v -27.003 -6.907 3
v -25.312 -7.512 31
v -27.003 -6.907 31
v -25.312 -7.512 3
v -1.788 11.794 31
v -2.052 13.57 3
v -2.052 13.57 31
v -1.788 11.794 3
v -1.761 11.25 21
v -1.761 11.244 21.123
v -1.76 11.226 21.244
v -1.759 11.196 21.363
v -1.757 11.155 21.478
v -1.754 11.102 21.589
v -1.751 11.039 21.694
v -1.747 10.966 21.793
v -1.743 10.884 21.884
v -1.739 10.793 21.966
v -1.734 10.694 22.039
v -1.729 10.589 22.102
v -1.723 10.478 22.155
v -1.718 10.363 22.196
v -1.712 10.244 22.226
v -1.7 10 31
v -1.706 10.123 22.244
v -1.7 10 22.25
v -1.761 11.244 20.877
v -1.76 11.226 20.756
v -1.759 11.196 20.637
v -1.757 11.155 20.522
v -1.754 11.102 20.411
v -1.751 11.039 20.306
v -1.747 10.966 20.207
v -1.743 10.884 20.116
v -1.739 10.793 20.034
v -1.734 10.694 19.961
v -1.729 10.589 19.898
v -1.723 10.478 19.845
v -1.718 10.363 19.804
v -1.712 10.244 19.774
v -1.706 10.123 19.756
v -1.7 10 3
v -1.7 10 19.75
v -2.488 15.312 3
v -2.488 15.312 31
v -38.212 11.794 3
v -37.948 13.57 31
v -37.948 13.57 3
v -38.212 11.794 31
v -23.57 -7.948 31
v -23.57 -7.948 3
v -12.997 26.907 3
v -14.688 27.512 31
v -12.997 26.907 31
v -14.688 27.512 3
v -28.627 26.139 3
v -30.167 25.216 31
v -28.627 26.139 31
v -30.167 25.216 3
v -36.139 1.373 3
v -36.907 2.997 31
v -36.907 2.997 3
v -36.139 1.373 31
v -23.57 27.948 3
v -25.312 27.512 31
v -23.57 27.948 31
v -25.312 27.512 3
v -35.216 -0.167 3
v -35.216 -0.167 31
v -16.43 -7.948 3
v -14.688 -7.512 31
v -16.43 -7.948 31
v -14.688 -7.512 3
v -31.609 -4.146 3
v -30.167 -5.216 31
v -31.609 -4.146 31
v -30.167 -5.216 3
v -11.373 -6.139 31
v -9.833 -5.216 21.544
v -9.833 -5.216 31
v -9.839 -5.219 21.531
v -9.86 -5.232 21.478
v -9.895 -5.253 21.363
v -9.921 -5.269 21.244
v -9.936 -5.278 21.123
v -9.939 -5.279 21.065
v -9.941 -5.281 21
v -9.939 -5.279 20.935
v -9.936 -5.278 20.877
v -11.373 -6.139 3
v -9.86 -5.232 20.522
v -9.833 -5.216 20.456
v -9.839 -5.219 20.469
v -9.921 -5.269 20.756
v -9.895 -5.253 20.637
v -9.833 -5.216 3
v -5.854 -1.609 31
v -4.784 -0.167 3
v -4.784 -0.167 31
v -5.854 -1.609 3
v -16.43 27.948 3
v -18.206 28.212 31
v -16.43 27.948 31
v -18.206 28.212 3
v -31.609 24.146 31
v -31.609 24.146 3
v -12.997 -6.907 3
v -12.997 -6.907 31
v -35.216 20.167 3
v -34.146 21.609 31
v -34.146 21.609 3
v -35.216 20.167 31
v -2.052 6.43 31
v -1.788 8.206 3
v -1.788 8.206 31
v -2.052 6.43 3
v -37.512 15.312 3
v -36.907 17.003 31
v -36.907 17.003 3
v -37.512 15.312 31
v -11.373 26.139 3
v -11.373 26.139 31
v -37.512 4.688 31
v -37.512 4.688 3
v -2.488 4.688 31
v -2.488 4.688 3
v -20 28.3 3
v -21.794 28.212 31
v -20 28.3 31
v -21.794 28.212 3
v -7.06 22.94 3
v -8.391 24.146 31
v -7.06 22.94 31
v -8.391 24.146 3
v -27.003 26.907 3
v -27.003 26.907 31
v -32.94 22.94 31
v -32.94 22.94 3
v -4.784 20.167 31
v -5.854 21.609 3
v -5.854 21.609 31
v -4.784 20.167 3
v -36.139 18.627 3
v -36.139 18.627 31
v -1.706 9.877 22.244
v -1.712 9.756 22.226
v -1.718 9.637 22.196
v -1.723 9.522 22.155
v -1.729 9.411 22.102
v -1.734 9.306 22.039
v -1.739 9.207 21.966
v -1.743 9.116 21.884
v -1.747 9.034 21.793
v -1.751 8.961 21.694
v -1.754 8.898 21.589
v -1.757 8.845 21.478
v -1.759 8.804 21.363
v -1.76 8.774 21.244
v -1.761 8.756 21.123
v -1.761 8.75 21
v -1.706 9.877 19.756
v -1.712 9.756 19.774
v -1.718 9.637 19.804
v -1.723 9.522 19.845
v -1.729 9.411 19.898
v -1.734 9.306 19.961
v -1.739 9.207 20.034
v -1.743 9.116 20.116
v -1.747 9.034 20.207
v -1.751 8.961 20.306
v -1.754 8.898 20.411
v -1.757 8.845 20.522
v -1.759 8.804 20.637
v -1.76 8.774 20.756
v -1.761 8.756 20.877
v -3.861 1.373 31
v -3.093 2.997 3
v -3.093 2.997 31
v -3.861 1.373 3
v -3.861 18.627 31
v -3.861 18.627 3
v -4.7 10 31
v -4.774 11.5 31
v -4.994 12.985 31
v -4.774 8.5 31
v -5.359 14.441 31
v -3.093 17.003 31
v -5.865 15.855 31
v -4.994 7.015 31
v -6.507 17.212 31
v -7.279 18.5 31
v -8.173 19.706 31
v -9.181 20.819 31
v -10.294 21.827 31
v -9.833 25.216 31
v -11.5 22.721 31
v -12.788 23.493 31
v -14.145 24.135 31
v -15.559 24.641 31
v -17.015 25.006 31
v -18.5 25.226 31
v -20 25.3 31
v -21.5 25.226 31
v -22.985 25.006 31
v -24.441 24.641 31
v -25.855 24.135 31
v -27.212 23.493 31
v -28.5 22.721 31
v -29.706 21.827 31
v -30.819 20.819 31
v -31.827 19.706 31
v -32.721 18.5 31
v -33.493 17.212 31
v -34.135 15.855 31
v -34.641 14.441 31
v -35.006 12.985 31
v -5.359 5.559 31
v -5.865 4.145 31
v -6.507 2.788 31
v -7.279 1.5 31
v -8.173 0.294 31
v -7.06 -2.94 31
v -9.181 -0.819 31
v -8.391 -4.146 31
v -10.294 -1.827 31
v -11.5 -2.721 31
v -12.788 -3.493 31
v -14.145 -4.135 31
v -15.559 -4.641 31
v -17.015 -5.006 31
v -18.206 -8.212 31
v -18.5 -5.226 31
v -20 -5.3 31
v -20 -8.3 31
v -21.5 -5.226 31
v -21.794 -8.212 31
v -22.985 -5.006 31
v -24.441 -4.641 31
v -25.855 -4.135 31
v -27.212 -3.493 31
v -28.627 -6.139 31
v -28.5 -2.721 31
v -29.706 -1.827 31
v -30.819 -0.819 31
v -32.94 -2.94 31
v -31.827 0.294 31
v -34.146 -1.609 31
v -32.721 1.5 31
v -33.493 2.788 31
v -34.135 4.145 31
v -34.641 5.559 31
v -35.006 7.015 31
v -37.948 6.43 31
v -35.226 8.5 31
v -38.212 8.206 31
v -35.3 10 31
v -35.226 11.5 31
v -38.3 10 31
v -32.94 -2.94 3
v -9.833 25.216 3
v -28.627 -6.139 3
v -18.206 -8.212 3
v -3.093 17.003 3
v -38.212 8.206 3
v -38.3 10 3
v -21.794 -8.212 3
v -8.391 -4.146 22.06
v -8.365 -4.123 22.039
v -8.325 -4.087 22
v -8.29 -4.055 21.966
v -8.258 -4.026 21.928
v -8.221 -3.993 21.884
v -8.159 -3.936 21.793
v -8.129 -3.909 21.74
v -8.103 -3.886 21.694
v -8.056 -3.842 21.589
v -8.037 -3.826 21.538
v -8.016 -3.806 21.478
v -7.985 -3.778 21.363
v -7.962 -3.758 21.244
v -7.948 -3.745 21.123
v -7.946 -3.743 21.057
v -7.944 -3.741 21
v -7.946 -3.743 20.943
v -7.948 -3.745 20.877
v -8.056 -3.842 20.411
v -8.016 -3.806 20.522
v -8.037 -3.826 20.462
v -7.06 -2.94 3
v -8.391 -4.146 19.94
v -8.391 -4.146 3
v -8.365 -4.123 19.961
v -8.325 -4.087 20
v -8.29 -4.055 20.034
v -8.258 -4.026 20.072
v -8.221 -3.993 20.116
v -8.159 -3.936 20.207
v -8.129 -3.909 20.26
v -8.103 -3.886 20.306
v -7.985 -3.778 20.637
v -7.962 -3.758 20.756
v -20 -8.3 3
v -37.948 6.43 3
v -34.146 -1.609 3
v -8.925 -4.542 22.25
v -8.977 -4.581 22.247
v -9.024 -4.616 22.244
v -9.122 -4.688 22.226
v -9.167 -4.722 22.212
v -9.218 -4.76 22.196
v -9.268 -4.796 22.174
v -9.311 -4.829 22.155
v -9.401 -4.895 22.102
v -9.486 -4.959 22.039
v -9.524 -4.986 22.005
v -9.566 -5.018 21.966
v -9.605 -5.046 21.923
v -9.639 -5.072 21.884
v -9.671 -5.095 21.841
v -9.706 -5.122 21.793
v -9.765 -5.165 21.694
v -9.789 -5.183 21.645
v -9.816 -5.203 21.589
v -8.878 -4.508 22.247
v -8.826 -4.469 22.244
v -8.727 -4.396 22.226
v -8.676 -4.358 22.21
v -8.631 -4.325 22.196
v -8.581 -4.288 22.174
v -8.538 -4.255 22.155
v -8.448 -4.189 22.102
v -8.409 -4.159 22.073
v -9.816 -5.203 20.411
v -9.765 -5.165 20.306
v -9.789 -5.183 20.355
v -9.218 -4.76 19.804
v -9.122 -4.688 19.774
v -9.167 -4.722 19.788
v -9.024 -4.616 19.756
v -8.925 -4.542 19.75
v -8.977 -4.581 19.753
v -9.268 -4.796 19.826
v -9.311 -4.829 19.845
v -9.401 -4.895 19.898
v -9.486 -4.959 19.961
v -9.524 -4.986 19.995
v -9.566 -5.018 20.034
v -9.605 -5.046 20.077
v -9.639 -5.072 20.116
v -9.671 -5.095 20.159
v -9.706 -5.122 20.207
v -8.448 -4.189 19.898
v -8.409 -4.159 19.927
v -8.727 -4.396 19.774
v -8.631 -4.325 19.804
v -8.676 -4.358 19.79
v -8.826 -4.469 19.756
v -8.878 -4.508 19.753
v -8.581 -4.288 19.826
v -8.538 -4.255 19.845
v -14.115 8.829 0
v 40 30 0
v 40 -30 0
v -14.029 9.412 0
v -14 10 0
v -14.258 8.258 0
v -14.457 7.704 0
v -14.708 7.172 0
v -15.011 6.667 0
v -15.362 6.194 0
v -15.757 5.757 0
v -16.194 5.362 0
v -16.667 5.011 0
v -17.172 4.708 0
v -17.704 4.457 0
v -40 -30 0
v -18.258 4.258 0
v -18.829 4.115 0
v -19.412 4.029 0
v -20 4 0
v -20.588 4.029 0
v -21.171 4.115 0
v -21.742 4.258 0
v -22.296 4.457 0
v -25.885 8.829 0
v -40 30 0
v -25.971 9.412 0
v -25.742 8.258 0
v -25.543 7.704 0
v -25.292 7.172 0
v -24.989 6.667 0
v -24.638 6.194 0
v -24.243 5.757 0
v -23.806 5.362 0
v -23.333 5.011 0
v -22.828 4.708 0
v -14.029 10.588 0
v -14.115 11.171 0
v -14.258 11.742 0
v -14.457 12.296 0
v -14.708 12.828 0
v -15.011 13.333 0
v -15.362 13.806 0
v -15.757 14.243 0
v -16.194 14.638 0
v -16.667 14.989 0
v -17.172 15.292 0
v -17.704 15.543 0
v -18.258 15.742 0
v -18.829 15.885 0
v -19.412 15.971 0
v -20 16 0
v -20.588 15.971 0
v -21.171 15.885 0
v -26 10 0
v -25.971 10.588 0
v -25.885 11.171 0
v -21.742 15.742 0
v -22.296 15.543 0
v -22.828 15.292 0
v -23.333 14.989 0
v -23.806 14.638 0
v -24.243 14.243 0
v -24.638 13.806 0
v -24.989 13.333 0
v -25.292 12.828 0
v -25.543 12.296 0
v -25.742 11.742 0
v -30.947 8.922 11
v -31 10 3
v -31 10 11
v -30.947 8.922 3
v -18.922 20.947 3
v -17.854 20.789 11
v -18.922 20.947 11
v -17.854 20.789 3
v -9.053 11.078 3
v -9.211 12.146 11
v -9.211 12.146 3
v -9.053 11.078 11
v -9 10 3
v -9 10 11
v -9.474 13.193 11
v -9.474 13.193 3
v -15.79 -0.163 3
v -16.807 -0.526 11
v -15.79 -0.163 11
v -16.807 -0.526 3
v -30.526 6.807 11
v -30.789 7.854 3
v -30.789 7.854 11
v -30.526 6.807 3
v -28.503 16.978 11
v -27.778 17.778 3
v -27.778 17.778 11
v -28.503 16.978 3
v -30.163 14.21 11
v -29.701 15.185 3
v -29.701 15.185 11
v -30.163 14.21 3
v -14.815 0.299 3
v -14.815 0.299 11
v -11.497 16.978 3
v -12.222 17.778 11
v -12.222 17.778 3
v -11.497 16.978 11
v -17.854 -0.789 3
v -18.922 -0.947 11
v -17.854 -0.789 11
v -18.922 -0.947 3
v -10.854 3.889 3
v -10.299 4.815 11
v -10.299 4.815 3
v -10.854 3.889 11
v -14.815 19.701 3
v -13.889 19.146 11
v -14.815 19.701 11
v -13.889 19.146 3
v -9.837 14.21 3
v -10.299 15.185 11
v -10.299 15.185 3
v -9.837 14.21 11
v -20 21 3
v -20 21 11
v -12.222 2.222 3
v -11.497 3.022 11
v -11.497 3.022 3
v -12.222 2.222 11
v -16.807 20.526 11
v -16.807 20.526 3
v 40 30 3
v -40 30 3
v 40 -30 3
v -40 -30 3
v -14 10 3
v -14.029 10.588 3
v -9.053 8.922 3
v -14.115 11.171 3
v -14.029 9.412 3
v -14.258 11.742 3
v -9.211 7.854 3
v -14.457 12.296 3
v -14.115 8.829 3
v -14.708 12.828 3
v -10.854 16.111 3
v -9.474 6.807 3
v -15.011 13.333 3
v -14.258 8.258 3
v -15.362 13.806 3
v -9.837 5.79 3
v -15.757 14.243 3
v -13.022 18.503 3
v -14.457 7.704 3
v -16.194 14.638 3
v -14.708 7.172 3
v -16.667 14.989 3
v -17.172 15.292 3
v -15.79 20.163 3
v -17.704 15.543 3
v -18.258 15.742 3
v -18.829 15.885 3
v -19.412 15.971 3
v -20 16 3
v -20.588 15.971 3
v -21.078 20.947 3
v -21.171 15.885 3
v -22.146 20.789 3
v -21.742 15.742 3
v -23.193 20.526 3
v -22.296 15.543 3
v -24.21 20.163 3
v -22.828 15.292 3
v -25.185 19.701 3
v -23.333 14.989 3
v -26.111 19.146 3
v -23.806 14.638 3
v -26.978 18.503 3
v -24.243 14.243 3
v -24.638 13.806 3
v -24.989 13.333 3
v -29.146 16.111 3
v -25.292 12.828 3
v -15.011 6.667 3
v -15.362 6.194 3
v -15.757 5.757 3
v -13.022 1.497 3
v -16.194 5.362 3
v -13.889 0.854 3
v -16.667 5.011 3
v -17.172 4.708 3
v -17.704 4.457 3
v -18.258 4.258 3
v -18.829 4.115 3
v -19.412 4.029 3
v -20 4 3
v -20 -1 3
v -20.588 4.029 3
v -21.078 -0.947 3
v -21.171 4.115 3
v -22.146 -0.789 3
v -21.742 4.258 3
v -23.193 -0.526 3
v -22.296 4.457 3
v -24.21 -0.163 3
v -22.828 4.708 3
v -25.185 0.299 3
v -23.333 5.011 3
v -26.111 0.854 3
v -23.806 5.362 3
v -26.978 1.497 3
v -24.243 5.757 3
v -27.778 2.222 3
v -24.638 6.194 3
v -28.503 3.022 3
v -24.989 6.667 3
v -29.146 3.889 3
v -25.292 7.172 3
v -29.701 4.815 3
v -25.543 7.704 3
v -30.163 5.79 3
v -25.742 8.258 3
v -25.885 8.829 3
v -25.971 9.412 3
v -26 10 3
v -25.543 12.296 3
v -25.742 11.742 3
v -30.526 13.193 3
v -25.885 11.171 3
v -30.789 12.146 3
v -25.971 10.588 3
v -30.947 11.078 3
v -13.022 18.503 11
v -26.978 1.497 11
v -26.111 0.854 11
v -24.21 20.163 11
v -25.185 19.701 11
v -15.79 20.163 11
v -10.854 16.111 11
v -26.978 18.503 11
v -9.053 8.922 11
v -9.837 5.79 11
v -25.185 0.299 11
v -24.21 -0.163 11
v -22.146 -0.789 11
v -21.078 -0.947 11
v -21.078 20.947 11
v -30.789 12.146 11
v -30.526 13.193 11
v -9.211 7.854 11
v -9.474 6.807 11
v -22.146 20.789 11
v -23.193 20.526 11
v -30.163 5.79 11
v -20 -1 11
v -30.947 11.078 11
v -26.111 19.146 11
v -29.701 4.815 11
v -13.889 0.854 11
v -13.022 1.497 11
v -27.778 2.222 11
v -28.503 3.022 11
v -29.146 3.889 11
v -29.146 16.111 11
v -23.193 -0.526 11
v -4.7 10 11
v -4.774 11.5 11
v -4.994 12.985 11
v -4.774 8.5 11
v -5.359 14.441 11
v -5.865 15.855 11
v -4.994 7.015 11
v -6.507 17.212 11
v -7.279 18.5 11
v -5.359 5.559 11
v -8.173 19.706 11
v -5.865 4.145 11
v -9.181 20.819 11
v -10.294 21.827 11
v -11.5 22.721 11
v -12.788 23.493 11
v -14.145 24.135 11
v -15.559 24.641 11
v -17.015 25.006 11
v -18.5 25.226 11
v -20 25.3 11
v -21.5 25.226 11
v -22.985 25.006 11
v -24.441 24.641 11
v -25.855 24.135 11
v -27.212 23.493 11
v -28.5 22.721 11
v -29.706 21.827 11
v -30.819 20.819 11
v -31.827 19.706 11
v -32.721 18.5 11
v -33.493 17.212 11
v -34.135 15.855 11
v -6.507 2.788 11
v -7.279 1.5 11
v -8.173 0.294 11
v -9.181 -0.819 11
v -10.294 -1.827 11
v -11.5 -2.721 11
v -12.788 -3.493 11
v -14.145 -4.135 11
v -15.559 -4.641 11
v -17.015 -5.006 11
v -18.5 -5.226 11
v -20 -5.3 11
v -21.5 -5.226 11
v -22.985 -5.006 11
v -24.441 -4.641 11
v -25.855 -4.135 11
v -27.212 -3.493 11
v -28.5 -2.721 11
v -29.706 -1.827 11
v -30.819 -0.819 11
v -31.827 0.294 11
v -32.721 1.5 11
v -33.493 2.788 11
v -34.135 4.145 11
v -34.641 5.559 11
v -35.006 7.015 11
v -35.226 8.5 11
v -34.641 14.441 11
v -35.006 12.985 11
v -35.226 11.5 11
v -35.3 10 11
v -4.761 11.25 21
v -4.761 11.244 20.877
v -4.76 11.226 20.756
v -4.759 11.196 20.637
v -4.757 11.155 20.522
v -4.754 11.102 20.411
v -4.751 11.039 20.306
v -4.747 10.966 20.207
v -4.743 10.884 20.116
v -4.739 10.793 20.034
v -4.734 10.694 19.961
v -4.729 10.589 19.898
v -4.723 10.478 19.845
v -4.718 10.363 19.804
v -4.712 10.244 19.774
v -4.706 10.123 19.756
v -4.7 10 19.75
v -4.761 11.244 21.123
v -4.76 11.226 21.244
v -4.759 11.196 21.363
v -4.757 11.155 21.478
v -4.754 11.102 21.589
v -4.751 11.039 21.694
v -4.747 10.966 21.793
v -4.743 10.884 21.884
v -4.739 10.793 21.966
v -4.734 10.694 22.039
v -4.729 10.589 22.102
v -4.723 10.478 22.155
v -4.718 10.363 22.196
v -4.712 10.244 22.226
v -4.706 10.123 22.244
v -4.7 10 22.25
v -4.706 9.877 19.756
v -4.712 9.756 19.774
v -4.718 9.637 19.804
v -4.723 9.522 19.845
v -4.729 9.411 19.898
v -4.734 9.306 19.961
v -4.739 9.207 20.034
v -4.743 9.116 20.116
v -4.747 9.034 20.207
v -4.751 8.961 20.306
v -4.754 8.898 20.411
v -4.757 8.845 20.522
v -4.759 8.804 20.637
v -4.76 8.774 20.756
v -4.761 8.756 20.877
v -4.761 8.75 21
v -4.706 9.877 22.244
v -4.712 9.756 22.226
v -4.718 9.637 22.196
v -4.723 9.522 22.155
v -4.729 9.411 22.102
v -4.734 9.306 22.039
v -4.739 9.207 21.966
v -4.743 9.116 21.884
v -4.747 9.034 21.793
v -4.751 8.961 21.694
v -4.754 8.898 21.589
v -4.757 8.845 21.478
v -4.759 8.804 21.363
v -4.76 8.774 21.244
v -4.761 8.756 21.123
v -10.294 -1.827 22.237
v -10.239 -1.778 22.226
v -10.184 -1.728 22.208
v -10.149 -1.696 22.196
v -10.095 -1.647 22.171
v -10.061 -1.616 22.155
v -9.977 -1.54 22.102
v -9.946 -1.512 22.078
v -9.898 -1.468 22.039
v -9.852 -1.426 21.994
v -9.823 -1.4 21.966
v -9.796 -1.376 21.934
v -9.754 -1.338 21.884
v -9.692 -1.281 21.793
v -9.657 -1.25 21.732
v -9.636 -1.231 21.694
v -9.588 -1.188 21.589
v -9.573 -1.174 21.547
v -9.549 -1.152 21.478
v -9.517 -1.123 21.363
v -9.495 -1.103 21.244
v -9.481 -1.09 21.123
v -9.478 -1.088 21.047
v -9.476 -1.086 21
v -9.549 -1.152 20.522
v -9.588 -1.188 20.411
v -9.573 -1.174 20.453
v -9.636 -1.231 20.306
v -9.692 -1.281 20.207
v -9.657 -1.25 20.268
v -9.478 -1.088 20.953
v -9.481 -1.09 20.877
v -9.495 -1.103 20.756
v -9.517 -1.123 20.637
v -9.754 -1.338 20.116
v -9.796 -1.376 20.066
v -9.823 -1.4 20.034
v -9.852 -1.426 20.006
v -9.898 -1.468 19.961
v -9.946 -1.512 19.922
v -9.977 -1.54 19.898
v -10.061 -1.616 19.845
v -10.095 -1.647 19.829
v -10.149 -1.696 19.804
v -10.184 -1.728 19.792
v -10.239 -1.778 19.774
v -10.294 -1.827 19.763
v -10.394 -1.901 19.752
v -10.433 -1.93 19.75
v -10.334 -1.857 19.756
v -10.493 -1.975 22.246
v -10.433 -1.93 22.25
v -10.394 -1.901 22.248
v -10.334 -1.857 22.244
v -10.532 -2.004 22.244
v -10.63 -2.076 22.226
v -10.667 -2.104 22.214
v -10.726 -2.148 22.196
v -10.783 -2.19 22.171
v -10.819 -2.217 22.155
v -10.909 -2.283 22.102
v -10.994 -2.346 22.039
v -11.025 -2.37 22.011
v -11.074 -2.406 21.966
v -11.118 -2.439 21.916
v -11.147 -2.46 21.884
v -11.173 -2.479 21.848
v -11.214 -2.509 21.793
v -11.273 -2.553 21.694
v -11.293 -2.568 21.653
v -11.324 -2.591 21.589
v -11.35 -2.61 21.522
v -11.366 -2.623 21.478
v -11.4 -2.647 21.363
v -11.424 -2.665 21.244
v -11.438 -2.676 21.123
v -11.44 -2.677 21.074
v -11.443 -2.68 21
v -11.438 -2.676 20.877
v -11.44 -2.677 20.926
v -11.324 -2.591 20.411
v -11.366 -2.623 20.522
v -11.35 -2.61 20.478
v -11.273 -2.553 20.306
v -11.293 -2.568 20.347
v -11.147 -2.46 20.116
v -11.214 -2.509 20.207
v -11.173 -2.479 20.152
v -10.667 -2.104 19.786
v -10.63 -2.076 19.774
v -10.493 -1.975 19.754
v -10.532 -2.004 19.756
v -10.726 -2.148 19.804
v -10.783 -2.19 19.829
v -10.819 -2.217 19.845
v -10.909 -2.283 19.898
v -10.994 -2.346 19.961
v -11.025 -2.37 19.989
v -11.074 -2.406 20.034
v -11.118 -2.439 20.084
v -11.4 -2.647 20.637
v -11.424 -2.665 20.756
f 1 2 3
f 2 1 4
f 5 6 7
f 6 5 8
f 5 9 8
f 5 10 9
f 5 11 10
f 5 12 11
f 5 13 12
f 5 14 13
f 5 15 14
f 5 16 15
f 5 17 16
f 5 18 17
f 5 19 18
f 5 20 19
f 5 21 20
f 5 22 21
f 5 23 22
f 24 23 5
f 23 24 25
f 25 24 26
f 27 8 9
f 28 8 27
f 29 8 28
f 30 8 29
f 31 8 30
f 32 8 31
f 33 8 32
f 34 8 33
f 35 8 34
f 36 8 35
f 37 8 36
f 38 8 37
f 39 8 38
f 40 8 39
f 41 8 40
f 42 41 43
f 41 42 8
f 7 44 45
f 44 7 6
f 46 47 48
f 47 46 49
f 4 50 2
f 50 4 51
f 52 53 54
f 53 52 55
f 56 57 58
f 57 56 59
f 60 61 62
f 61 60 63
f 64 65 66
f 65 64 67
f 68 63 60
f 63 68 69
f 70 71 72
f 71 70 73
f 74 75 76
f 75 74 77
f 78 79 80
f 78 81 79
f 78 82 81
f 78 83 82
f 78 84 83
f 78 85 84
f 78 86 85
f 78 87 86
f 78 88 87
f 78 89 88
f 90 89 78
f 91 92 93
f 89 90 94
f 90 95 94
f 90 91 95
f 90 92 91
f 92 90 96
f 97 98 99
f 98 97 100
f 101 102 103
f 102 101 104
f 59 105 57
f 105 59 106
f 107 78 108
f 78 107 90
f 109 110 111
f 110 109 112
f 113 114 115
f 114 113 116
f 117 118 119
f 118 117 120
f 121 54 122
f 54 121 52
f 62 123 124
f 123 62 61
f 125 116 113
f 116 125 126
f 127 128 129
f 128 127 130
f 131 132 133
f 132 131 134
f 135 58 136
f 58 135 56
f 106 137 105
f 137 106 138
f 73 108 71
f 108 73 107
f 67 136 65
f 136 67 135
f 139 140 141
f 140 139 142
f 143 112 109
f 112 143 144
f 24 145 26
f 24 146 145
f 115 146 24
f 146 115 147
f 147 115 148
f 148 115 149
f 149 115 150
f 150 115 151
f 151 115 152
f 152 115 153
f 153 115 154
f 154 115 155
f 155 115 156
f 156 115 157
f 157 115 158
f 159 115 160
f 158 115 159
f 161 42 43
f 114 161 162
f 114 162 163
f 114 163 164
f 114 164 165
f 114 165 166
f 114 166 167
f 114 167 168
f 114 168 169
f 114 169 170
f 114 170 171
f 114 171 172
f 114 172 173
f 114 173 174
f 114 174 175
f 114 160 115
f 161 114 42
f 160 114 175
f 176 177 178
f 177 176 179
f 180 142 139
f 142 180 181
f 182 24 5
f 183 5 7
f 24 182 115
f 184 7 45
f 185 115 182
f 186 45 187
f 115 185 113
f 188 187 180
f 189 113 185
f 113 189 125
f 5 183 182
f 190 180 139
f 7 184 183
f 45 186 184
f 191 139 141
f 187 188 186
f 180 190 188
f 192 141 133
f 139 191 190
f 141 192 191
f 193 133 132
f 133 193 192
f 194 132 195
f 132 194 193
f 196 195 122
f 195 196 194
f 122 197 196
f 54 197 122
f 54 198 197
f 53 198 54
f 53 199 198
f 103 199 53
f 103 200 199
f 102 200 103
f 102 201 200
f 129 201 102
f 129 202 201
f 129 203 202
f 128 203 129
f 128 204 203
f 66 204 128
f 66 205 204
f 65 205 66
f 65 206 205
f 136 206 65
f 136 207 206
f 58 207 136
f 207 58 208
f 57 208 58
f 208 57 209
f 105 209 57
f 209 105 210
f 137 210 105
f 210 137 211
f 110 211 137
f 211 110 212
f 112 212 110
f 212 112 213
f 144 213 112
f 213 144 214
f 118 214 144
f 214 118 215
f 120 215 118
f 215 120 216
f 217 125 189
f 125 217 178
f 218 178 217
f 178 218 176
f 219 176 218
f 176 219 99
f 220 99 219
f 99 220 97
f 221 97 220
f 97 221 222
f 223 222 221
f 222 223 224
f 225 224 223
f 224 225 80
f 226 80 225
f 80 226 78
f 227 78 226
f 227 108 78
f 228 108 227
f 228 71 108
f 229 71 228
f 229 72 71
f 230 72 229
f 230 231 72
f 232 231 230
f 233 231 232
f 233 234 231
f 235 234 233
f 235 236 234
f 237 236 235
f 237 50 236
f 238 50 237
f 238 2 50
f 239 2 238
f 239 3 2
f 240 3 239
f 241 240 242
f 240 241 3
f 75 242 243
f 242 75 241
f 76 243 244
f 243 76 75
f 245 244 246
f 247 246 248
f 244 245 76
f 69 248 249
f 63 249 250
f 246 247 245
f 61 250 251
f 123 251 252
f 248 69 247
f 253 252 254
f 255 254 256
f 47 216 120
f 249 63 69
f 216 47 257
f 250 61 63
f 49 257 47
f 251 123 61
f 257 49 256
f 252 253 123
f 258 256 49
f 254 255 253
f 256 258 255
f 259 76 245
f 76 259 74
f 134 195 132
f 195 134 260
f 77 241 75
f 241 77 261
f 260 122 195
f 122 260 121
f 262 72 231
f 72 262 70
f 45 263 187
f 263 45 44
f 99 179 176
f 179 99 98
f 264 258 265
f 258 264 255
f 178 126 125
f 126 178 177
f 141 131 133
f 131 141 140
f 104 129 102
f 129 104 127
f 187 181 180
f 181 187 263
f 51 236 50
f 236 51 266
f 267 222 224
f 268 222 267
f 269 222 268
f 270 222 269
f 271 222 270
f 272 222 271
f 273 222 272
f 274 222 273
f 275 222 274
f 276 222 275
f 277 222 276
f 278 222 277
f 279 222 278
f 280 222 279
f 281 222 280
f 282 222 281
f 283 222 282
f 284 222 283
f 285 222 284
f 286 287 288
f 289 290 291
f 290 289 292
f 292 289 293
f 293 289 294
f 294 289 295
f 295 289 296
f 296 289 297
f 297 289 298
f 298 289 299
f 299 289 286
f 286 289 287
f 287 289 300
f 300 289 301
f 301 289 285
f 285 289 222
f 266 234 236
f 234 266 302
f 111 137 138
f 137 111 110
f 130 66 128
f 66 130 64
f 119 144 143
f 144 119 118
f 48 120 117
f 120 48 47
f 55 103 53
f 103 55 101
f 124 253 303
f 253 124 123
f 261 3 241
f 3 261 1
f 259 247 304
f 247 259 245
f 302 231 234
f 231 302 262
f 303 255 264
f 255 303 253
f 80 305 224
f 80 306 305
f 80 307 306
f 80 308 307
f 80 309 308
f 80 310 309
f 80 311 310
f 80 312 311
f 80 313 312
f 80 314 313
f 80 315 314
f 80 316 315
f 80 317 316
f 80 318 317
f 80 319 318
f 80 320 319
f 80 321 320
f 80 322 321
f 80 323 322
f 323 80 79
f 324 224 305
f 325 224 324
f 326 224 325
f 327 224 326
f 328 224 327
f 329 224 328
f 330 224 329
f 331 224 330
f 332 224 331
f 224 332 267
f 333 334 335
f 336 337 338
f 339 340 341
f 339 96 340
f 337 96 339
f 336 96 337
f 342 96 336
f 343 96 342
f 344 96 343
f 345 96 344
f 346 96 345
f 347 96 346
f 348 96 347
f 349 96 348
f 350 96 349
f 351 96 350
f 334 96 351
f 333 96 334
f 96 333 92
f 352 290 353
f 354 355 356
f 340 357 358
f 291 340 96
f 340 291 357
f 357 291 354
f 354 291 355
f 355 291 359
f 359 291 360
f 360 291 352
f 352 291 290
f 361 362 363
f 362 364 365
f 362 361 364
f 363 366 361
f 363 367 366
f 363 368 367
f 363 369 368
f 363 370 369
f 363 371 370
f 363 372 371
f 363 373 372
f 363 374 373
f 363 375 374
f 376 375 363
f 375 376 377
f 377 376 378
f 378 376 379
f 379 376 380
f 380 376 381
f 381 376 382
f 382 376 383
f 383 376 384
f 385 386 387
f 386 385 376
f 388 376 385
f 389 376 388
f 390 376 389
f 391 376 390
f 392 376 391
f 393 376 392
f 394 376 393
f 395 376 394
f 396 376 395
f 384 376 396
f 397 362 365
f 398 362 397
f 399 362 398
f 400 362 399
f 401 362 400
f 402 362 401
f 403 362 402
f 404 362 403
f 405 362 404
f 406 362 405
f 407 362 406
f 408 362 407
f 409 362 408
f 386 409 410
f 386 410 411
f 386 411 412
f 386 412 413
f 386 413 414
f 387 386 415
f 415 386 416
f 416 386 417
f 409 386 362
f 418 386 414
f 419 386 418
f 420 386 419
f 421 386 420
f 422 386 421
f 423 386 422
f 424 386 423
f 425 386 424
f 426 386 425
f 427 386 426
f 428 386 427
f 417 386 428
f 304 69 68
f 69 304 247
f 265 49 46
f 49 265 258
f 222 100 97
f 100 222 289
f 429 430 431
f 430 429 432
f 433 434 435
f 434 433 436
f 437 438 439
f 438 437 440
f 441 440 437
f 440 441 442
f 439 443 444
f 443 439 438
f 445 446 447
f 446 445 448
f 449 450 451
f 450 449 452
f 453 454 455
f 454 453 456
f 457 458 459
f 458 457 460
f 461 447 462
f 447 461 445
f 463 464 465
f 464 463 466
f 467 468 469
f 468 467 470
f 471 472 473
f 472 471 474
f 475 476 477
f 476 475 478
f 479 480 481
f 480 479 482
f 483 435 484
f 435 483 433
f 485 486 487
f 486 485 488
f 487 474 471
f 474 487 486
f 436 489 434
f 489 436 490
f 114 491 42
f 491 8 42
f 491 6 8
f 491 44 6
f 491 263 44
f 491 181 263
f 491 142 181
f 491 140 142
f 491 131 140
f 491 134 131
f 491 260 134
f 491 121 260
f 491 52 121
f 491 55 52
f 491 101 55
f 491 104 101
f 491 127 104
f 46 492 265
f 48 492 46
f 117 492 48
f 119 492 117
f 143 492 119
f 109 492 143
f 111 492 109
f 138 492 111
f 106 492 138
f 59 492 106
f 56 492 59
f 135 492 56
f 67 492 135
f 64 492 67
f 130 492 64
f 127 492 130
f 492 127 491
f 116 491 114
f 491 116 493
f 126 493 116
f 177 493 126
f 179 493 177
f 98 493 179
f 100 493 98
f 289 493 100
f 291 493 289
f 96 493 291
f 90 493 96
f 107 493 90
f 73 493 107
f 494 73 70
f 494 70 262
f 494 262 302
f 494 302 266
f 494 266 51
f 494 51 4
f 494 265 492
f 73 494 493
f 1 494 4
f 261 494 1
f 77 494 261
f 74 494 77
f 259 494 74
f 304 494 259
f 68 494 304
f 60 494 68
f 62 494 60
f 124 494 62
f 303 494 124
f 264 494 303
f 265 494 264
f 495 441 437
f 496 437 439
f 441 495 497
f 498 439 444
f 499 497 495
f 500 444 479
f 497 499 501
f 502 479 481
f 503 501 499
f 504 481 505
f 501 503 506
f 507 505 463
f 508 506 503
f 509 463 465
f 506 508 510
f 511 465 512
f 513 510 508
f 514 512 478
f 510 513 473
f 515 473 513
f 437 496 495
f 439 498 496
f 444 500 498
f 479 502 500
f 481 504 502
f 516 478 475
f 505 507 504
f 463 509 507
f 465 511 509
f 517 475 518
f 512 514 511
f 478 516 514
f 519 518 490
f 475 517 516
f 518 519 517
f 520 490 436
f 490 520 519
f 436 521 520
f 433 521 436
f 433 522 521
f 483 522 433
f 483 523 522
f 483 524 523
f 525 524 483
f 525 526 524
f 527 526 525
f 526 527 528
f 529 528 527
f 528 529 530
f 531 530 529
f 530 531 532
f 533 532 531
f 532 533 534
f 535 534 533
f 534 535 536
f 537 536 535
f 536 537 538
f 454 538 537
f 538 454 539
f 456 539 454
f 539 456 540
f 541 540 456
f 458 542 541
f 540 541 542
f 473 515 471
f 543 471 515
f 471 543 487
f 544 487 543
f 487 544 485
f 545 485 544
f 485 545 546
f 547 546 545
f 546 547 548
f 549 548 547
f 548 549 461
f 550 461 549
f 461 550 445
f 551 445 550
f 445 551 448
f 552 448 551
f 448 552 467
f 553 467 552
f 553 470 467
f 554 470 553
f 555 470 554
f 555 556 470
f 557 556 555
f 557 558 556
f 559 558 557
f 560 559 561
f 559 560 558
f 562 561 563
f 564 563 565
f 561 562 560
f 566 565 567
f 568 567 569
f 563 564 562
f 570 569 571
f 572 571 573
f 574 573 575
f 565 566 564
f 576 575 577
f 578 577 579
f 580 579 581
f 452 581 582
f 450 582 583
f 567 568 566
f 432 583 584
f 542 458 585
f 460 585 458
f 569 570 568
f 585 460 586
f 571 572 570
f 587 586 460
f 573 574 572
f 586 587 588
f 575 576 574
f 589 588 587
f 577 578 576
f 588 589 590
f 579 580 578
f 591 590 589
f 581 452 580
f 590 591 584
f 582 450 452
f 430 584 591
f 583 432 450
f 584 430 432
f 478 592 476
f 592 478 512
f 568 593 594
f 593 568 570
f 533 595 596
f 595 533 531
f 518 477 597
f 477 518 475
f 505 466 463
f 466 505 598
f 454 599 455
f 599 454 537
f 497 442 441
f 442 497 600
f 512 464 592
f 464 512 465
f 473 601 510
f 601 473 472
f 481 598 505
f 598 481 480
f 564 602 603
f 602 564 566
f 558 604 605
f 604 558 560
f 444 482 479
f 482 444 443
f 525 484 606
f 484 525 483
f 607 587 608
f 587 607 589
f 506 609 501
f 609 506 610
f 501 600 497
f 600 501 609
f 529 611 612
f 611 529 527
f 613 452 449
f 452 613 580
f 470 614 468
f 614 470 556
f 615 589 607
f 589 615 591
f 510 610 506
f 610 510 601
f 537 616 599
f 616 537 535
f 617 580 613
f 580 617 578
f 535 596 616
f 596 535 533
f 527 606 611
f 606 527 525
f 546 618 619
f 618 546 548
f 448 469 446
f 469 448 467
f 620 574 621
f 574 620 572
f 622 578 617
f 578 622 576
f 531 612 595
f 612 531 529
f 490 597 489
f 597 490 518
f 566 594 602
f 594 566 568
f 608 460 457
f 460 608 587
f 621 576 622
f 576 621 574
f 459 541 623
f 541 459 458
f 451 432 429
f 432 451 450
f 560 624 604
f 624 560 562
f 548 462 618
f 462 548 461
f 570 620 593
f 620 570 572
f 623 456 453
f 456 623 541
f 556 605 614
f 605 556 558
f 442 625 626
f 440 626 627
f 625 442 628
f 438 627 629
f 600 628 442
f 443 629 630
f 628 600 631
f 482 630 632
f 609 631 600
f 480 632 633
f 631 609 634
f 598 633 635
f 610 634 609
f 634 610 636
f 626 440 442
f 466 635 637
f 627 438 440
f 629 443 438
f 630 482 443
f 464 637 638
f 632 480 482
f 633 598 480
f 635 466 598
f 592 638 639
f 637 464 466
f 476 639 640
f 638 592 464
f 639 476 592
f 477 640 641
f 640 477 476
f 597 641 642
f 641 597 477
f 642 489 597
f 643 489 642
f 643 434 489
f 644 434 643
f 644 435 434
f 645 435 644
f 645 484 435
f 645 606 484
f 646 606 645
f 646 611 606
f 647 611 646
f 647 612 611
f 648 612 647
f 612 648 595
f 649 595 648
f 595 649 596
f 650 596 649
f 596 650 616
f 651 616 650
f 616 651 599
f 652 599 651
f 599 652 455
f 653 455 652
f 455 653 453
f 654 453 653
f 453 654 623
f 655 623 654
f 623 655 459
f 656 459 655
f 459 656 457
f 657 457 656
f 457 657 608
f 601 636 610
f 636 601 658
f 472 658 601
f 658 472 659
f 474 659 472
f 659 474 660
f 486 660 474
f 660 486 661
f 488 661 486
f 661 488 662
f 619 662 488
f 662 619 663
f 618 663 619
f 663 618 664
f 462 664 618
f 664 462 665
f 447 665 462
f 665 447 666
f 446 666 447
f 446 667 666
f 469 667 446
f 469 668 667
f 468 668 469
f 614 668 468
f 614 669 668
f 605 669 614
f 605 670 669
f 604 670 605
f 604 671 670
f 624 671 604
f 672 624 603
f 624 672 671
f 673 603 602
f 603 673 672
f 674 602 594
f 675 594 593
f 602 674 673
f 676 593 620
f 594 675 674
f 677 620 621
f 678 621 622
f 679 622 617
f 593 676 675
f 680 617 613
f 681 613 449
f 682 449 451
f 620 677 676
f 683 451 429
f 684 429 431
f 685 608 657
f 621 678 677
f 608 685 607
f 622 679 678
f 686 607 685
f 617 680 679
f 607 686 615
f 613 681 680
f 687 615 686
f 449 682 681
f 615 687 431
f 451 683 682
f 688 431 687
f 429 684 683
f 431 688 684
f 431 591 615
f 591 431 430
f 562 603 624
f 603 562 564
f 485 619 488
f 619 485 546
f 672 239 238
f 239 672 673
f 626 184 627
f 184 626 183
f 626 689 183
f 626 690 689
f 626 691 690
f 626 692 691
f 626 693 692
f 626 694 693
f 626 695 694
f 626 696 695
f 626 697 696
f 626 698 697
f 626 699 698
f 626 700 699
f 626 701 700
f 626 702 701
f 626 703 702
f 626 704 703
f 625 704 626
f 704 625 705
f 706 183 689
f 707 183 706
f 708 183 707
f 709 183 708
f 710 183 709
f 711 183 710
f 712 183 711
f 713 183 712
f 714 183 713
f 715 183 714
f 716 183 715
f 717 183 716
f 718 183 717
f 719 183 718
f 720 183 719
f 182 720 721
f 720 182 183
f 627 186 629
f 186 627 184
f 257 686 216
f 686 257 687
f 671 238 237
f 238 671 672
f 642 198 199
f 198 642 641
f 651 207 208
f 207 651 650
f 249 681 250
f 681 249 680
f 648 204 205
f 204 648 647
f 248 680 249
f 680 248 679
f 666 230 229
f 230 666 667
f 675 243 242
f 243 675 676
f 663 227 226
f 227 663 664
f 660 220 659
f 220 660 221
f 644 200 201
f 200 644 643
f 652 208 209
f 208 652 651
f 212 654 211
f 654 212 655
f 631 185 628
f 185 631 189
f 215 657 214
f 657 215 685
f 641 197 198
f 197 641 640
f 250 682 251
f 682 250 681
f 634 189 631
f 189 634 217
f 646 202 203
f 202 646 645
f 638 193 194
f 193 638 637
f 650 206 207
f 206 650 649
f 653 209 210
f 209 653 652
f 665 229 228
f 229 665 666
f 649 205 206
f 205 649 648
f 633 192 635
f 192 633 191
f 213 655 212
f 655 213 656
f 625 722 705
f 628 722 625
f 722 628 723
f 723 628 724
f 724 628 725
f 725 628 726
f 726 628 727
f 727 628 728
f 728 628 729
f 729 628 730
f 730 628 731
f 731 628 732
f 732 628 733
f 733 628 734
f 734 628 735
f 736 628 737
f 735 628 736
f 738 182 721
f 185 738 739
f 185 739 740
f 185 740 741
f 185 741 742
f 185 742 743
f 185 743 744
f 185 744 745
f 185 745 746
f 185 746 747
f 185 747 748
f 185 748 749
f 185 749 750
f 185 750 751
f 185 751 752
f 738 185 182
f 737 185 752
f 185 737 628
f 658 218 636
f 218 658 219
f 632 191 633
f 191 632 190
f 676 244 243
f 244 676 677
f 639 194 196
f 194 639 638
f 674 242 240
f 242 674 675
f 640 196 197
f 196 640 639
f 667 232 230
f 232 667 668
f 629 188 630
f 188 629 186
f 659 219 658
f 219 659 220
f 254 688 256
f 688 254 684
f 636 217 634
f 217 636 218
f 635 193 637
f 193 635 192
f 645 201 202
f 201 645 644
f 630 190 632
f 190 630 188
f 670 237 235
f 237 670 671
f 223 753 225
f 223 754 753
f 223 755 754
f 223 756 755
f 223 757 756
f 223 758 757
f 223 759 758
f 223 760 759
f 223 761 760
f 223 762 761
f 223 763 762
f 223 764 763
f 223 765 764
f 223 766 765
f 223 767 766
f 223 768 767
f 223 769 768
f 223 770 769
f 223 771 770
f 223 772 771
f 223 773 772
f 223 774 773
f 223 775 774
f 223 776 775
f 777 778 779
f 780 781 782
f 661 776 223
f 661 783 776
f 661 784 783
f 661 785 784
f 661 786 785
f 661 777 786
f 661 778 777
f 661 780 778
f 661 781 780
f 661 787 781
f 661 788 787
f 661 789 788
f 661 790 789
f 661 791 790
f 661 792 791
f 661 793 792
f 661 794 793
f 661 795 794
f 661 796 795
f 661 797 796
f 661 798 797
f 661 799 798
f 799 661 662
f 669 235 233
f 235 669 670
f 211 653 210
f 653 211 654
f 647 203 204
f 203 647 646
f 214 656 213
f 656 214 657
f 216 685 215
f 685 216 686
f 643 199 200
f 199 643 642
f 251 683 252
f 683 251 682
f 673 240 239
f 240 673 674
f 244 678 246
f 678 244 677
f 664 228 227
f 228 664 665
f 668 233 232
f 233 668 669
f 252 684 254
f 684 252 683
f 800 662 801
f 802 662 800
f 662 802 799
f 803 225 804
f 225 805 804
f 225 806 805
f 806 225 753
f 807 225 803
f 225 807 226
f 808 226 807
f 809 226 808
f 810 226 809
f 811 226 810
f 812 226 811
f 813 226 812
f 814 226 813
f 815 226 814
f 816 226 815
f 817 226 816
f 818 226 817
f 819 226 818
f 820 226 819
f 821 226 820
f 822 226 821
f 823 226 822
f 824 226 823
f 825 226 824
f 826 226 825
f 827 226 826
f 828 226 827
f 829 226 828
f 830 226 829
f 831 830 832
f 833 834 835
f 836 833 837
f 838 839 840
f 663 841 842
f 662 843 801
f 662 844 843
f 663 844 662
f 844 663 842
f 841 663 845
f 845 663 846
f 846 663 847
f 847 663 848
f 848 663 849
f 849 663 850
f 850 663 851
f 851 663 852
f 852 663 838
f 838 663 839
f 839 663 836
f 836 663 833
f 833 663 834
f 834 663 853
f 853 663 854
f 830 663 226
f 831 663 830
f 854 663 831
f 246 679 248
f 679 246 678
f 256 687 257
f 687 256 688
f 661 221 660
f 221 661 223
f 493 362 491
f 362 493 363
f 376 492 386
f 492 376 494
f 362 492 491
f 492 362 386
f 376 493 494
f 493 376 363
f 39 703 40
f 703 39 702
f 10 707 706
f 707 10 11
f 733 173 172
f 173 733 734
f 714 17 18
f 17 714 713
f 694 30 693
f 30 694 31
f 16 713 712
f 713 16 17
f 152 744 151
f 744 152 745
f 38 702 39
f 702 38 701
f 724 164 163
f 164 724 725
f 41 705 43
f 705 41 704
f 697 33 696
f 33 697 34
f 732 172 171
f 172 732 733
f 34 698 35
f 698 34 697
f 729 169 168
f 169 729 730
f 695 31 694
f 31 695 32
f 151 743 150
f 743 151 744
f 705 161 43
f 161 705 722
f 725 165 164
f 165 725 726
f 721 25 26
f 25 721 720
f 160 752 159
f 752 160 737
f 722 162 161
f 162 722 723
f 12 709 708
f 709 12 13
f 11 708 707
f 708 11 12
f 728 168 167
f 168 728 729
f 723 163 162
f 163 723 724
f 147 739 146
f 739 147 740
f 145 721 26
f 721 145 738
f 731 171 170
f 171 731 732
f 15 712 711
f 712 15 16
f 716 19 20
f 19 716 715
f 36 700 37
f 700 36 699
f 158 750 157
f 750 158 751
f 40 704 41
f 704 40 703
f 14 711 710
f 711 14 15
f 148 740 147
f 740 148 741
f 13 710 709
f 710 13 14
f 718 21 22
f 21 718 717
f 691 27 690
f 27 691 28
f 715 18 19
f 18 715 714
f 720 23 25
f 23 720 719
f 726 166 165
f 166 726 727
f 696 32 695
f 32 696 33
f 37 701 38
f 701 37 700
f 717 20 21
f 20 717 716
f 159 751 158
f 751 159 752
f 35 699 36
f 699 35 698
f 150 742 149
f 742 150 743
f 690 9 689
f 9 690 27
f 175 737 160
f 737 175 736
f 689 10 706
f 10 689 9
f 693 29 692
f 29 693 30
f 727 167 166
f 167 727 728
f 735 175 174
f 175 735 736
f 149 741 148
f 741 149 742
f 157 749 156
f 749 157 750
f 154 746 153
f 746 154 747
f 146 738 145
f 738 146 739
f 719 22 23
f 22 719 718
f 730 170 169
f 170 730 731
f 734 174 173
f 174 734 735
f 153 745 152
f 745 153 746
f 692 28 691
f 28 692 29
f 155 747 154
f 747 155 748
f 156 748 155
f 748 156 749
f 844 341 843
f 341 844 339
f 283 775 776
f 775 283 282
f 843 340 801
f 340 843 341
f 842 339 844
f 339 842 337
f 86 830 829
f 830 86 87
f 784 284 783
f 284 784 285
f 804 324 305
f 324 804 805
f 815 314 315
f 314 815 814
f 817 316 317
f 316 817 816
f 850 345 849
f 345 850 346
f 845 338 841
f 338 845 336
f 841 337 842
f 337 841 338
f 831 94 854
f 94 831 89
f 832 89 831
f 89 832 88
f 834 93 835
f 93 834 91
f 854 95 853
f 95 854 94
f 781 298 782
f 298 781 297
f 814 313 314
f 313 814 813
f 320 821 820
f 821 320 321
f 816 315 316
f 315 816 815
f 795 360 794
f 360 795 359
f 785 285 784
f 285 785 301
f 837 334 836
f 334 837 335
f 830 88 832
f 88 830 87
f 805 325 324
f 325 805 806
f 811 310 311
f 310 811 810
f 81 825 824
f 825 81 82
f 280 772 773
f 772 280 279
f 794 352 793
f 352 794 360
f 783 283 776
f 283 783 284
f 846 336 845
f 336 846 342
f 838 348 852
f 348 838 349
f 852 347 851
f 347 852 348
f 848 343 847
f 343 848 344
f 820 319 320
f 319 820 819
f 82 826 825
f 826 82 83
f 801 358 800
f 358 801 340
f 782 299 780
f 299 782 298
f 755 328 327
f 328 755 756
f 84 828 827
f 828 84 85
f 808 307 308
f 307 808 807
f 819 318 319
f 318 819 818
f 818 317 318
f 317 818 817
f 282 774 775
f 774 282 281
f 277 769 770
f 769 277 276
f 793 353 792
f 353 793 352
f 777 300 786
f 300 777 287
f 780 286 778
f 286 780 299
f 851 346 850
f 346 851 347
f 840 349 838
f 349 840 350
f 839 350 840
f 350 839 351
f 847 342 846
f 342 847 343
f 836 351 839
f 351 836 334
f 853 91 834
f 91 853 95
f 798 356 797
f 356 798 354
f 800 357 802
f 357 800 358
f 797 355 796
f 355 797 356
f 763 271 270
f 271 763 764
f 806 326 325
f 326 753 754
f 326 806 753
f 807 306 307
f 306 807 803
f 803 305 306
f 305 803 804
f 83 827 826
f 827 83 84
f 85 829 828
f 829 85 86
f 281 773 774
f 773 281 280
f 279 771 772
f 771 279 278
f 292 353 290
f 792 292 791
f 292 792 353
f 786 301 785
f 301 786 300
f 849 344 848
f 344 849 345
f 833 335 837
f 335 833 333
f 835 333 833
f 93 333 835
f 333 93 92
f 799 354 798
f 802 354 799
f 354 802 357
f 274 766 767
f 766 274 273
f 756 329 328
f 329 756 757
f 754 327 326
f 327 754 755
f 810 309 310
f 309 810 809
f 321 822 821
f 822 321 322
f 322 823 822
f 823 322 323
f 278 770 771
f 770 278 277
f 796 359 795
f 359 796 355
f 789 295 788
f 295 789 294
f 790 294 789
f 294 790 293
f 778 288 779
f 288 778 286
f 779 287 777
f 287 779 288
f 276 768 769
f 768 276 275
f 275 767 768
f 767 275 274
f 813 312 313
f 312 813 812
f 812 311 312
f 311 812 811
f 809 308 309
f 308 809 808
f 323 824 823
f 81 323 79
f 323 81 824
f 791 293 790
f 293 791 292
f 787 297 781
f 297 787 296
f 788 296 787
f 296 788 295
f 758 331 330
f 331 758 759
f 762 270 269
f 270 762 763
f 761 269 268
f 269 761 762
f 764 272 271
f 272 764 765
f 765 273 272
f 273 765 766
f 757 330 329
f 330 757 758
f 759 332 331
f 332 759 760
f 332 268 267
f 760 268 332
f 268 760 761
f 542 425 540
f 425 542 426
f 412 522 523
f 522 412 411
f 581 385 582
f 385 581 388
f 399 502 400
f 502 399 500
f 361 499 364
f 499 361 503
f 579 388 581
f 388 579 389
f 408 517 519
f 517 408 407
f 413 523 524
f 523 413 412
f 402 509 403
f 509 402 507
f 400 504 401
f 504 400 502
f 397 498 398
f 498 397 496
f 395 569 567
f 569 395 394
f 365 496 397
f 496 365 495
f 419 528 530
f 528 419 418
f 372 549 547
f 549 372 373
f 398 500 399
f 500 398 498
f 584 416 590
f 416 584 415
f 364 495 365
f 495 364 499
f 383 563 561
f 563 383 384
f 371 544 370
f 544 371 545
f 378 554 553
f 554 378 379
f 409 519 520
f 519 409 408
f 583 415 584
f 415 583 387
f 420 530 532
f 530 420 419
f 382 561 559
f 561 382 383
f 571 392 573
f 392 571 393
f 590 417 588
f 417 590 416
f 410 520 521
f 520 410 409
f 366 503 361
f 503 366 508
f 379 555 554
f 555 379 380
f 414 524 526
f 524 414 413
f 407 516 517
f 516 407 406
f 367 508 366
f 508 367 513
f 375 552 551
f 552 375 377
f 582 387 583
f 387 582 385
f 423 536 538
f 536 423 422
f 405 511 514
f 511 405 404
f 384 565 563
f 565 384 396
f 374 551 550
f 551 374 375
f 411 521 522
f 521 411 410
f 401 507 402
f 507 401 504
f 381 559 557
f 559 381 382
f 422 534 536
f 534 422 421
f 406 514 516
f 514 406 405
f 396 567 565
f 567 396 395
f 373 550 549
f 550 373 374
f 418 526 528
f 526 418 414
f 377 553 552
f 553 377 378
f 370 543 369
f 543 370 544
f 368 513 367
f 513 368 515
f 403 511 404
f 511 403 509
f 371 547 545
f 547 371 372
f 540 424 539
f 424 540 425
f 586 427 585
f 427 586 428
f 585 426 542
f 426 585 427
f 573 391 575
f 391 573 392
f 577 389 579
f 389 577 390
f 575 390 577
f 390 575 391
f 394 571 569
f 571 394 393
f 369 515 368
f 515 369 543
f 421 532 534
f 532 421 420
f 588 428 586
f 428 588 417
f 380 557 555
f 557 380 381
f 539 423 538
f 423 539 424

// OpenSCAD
// Adapter: phone camera over microscope eyepiece (30 mm OD), printed phone-side down.
// All dimensions in mm, measured with calipers.

$fn = 64;

// ---- Plate (rests on bed, z = 0..3, centred on origin) ----
plate_x = 80;   // plate length in X
plate_y = 60;   // plate width  in Y
plate_t = 3;    // plate thickness
cam_hole_d = 12;   // camera through-hole diameter
cam_hole_x = -20;  // camera hole centre X
cam_hole_y =  10;  // camera hole centre Y

// ---- Sleeve (round, on camera-hole axis, z = 3..31) ----
sleeve_od  = 36.6;  // sleeve outer diameter
sleeve_z0  = 3;     // sleeve base (top of plate)
sleeve_z1  = 31;    // sleeve top (open)
bore_stop_d  = 22;   // bore diameter in stop section (sets eyepiece distance)
bore_stop_z1 = 11;   // stop section ends here
bore_slide_d = 30.6; // bore diameter in sliding section (over 30 mm eyepiece)

// ---- M3 centring screw holes (radial, through sleeve wall) ----
screw_hole_d = 2.5;  // hole diameter for M3 screws
screw_z      = 21;   // hole axis height
screw_n      = 3;    // number of radial holes
screw_ang0   = 0;    // first hole points +X

// ============================ BODY ============================
module body() { union() {
    // Flat plate
    translate([-plate_x/2, -plate_y/2, 0])
        cube([plate_x, plate_y, plate_t]);

    // Sleeve: outer cylinder minus two bore sections
    difference() {
        translate([cam_hole_x, cam_hole_y, 0])
            cylinder(h = sleeve_z1, d = sleeve_od);

        // Stop bore (z = 3..11)
        translate([cam_hole_x, cam_hole_y, sleeve_z0])
            cylinder(h = bore_stop_z1 - sleeve_z0, d = bore_stop_d);

        // Slide bore (z = 11..31, open top)
        translate([cam_hole_x, cam_hole_y, bore_stop_z1])
            cylinder(h = sleeve_z1 - bore_stop_z1, d = bore_slide_d);
    }
} }

// ============================ CUTS ============================
// Camera through-hole in plate (extends 1 mm past each face)
module cam_cut() { translate([cam_hole_x, cam_hole_y, -1])
    cylinder(h = plate_t + 2, d = cam_hole_d); }

// Radial M3 centring-screw holes through sleeve wall
module screw_cut(i) {
    rotate([0, 0, screw_ang0 + i * 360 / screw_n])
        translate([cam_hole_x, cam_hole_y, screw_z])
            rotate([0, 90, 0])
                cylinder(h = sleeve_od + 2, d = screw_hole_d);
}

// ============================ FINAL PART ============================
difference() {
    body();
    cam_cut();
    for (i = [0 : screw_n - 1])
        screw_cut(i);
}
